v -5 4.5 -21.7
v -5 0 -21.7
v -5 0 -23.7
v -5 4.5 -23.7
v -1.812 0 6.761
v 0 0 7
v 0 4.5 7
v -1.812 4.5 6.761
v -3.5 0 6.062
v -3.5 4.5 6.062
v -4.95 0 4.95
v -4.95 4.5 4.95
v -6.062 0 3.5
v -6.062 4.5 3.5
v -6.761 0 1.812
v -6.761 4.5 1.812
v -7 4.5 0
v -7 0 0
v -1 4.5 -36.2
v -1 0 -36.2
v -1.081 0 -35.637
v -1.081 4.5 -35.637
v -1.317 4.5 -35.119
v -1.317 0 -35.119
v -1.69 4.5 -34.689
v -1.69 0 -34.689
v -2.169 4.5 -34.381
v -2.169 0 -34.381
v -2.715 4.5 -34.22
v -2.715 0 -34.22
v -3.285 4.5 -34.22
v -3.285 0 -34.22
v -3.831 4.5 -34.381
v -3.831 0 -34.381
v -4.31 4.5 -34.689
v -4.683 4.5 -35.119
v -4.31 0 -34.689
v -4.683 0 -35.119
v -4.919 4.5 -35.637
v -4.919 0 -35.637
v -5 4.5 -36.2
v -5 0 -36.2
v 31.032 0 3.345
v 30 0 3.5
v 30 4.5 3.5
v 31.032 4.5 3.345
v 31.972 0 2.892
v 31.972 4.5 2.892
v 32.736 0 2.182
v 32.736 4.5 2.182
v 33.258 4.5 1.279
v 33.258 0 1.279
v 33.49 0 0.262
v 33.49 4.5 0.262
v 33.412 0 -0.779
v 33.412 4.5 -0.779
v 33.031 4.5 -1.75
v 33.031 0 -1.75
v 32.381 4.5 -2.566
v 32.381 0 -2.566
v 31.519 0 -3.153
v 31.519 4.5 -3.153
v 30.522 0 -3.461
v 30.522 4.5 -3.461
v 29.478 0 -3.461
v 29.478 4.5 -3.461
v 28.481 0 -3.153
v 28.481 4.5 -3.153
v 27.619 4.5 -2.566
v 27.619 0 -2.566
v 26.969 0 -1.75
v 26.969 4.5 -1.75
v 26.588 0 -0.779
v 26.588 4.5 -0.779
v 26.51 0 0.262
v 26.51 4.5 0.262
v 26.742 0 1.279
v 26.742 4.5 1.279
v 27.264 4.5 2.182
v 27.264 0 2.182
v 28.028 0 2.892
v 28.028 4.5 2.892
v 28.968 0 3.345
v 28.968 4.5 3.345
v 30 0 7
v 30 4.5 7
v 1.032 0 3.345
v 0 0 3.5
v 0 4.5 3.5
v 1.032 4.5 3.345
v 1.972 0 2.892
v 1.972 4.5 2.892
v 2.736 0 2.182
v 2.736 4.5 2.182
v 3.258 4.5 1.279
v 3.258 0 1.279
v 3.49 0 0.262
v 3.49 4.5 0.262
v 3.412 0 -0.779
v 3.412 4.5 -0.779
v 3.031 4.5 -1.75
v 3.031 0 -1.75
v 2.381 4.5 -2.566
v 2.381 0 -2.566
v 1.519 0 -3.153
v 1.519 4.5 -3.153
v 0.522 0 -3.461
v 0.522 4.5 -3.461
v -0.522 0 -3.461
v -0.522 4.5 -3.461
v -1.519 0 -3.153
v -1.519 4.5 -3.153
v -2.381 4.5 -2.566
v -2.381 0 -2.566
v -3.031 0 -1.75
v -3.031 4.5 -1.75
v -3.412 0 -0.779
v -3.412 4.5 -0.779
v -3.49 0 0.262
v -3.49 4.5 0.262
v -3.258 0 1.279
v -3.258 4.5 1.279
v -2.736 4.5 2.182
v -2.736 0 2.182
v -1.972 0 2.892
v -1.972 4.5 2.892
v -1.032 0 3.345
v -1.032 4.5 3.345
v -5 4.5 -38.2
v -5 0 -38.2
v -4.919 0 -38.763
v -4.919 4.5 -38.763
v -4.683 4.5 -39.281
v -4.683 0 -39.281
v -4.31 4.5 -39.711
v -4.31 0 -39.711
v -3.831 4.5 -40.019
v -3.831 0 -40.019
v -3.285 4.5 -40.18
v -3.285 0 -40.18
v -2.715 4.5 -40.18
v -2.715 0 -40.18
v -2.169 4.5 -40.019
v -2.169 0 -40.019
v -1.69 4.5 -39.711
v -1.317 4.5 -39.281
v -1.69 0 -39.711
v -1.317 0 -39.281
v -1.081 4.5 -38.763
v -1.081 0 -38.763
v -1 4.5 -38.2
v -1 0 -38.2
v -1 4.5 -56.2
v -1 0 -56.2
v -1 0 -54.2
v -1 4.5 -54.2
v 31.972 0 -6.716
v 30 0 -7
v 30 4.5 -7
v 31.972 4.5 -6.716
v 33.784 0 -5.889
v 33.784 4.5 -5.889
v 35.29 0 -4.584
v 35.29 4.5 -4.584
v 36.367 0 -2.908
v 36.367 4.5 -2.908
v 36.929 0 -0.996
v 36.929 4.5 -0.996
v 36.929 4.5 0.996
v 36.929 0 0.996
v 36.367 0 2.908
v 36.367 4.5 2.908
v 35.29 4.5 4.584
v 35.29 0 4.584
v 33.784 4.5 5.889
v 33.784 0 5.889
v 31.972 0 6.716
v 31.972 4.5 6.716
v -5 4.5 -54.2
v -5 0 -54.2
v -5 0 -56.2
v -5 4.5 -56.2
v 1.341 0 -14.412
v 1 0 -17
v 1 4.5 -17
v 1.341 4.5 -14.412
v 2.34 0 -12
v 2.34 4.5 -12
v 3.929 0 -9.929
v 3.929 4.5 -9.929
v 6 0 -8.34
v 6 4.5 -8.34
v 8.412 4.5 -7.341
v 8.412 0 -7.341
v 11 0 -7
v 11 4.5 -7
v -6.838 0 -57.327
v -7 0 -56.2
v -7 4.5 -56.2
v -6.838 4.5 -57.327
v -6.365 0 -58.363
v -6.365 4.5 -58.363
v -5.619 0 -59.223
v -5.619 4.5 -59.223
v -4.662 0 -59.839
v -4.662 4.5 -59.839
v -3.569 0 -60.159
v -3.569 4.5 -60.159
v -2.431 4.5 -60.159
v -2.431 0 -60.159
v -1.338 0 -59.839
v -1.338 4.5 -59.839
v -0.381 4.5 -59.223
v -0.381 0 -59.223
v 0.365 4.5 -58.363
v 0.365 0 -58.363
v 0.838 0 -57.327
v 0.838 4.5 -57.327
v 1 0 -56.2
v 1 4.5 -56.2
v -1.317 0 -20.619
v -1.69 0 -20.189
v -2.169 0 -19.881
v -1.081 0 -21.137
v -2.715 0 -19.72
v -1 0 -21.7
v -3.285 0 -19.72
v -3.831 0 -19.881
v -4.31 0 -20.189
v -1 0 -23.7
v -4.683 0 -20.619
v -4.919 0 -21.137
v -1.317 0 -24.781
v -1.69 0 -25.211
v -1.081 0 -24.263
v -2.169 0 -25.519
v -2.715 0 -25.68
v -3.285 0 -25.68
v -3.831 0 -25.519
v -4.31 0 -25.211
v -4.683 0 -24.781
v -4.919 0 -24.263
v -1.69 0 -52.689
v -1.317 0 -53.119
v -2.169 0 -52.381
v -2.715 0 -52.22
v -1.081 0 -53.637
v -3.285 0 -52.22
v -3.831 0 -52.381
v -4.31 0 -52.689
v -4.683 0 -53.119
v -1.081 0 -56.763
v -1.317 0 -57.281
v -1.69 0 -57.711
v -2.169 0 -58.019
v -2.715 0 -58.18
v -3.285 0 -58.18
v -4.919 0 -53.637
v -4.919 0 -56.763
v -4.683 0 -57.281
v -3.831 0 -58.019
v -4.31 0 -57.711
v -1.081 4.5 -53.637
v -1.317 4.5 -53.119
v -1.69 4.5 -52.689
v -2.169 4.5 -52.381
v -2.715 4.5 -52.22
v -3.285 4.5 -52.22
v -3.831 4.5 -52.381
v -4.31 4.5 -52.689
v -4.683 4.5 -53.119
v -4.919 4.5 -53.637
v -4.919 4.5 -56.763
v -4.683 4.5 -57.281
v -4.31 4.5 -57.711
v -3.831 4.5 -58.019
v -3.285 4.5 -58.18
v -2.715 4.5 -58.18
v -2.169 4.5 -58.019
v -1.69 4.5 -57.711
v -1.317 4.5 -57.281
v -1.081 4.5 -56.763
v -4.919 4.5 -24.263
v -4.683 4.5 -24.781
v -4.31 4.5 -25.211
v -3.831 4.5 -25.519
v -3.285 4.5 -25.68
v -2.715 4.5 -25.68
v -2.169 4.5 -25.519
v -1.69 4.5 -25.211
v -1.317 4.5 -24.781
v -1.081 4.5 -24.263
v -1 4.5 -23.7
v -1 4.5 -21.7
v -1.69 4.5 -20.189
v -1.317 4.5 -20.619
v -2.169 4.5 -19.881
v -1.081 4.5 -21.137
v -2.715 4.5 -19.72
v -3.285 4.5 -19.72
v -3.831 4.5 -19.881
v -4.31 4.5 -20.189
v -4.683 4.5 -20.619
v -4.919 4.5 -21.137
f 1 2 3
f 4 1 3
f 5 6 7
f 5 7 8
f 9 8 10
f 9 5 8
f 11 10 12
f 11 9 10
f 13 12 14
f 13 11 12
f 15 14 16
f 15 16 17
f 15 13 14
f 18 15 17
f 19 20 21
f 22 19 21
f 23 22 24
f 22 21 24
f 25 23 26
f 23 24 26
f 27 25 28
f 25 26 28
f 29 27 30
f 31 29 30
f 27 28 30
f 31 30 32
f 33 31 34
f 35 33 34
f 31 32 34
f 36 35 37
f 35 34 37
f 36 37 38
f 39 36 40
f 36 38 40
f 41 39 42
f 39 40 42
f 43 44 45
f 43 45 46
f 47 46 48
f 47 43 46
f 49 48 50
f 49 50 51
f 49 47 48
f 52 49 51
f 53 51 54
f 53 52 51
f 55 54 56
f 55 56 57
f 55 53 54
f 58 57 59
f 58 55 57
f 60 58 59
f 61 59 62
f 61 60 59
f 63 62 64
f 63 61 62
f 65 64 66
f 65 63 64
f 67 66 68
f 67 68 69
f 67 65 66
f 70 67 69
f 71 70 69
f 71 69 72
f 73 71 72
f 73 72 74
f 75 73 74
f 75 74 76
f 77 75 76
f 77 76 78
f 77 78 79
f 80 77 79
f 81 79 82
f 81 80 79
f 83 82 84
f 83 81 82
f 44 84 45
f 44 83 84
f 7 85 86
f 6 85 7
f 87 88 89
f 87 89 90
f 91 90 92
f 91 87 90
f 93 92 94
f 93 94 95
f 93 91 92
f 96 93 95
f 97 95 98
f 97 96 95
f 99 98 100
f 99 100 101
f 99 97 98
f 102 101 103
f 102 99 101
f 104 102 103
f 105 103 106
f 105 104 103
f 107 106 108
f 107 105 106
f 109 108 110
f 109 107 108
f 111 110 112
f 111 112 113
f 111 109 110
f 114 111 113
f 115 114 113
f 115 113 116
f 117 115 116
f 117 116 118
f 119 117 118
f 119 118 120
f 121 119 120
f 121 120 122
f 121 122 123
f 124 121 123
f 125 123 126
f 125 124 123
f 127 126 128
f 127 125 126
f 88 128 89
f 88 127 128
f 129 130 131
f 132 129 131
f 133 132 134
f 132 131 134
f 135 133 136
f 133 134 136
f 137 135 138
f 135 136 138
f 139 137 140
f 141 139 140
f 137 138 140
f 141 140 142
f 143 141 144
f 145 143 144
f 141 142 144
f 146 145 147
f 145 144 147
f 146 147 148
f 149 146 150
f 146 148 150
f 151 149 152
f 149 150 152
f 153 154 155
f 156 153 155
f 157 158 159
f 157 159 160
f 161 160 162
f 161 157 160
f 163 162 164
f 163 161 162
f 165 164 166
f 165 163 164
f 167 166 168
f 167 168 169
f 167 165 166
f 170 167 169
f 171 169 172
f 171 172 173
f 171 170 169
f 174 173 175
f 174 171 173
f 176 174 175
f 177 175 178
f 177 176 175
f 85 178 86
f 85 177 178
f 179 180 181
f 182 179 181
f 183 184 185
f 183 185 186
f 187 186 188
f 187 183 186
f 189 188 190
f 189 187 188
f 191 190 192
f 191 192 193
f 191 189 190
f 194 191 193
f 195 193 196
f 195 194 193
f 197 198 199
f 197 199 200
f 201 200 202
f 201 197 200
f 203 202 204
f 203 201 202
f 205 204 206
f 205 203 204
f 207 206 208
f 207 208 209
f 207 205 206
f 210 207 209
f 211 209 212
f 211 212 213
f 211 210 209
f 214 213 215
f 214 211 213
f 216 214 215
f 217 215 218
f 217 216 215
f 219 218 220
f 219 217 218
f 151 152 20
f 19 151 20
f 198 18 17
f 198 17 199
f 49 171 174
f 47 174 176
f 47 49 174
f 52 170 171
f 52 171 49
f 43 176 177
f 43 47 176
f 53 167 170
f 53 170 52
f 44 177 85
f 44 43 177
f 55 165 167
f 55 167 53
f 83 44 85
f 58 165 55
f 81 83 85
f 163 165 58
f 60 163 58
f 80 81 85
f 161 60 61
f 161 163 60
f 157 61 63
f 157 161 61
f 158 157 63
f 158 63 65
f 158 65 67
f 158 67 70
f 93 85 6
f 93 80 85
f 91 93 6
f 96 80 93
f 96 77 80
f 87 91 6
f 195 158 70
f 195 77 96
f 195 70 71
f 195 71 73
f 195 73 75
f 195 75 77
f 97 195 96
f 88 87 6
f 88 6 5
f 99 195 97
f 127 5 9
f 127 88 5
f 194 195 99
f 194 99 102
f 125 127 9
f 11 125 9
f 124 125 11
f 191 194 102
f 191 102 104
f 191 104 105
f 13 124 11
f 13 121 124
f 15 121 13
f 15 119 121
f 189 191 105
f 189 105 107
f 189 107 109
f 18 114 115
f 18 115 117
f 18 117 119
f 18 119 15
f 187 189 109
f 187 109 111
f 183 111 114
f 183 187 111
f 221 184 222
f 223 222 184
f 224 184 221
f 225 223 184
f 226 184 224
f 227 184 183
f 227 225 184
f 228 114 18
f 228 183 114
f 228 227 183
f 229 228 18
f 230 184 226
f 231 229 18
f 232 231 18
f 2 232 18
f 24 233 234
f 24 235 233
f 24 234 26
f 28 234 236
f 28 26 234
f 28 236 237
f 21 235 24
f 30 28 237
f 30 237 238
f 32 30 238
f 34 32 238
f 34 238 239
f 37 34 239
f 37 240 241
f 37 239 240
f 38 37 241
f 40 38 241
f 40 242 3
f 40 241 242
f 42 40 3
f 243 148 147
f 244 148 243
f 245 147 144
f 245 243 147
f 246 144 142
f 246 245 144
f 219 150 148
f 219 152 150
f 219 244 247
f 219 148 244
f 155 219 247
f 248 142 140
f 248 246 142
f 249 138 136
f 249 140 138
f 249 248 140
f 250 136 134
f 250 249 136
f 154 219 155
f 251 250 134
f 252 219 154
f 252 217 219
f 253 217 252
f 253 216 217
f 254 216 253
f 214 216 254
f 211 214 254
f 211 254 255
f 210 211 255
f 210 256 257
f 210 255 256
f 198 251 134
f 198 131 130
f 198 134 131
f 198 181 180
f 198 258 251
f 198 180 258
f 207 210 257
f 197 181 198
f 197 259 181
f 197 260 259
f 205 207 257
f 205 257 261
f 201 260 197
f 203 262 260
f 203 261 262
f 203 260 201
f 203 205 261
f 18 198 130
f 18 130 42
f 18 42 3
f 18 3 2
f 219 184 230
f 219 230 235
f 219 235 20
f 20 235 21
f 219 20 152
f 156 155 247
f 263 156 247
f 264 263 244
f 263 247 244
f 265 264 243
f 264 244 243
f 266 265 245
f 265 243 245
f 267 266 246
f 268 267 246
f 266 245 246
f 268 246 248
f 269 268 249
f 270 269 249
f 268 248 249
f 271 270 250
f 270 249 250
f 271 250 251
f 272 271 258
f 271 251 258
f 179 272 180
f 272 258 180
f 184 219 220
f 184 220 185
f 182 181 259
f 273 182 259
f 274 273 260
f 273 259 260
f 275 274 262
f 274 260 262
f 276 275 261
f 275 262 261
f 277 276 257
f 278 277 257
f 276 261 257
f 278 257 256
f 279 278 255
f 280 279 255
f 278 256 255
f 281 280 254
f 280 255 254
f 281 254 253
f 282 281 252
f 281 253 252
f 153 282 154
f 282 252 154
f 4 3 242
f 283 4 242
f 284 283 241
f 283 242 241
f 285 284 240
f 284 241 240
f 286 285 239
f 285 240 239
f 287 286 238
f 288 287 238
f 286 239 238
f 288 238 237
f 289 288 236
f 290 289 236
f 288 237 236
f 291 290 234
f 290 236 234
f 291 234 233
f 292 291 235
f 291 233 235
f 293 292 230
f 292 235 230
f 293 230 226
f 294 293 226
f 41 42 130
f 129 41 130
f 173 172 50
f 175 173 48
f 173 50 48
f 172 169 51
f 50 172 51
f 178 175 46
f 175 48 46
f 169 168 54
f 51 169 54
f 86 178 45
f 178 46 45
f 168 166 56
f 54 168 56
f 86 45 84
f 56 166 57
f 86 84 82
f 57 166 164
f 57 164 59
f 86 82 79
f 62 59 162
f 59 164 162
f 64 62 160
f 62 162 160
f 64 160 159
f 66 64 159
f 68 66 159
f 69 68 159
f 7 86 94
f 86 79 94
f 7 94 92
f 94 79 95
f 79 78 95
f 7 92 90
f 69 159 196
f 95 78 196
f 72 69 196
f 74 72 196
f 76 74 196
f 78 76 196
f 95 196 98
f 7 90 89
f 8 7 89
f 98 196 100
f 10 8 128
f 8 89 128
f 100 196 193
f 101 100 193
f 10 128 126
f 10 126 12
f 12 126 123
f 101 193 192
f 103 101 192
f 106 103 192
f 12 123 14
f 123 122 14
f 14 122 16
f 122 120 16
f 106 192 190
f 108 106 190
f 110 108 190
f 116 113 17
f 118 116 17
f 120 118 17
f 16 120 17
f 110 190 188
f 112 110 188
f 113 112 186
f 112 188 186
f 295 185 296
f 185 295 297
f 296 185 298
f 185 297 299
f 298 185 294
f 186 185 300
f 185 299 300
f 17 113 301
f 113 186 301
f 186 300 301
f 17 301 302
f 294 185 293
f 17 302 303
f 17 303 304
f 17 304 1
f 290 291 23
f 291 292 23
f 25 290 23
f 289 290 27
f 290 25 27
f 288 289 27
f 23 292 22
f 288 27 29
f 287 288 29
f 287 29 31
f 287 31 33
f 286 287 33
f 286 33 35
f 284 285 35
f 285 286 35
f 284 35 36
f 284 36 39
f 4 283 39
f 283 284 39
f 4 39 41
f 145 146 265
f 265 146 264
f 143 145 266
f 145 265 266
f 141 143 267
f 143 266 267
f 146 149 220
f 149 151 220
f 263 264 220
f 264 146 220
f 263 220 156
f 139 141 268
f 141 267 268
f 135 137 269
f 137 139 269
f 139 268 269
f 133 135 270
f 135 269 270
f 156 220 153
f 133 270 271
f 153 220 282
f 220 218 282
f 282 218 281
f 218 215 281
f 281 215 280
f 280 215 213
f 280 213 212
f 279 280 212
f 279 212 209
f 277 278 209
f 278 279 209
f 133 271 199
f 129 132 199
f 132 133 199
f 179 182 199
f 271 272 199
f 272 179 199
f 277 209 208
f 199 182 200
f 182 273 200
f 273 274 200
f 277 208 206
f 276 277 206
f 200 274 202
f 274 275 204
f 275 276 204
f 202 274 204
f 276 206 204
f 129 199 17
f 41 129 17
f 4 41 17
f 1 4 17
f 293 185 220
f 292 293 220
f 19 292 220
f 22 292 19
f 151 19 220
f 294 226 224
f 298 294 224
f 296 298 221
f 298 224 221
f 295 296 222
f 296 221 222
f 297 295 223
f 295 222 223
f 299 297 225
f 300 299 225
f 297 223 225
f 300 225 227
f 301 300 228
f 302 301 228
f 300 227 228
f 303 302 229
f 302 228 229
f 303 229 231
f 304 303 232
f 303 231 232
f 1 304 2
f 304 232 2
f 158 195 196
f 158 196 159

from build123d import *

# Parameters (mm, degrees)
SKETCH1_R           = 3.5
BOSS_EXTRUDE1_DEPTH = 4.5


with BuildPart() as part:
    # Sketch1 → Boss-Extrude1 (new body)
    with BuildSketch(Plane(origin=(0, 0, 0), x_dir=(1, 0, 0), z_dir=(0, 1, 0))):
        with BuildLine():
            Line((11, 7), (30, 7))
            ThreePointArc((30, 7), (37, 0), (30, -7))
            Line((30, -7), (0, -7))
            ThreePointArc((0, -7), (-4.949747468, -4.949747468), (-7, 0))
            Line((-7, 0), (-7, 21.7))
            Line((-7, 21.7), (-7, 56.2))
            ThreePointArc((-7, 56.2), (-3, 60.2), (1, 56.2))
            Line((1, 56.2), (1, 17))
            ThreePointArc((1, 17), (3.928932188, 9.928932188), (11, 7))
        make_face()
        with Locations(Location((0, 0, 0), (0, 0, 270))):
            Circle(SKETCH1_R, mode=Mode.SUBTRACT)
        with Locations(Location((30, 0, 0), (0, 0, 270))):
            Circle(SKETCH1_R, mode=Mode.SUBTRACT)
        with BuildLine():
            Line((-5, 21.7), (-5, 23.7))
            ThreePointArc((-5, 23.7), (-3, 25.7), (-1, 23.7))
            Line((-1, 23.7), (-1, 21.7))
            ThreePointArc((-1, 21.7), (-3, 19.7), (-5, 21.7))
        make_face(mode=Mode.SUBTRACT)
        with BuildLine():
            Line((-5, 36.2), (-5, 38.2))
            ThreePointArc((-5, 38.2), (-3, 40.2), (-1, 38.2))
            Line((-1, 38.2), (-1, 36.2))
            ThreePointArc((-1, 36.2), (-3, 34.2), (-5, 36.2))
        make_face(mode=Mode.SUBTRACT)
        with BuildLine():
            Line((-5, 54.2), (-5, 56.2))
            ThreePointArc((-5, 56.2), (-3, 58.2), (-1, 56.2))
            Line((-1, 56.2), (-1, 54.2))
            ThreePointArc((-1, 54.2), (-3, 52.2), (-5, 54.2))
        make_face(mode=Mode.SUBTRACT)
    extrude(amount=BOSS_EXTRUDE1_DEPTH)


solid = part.part
